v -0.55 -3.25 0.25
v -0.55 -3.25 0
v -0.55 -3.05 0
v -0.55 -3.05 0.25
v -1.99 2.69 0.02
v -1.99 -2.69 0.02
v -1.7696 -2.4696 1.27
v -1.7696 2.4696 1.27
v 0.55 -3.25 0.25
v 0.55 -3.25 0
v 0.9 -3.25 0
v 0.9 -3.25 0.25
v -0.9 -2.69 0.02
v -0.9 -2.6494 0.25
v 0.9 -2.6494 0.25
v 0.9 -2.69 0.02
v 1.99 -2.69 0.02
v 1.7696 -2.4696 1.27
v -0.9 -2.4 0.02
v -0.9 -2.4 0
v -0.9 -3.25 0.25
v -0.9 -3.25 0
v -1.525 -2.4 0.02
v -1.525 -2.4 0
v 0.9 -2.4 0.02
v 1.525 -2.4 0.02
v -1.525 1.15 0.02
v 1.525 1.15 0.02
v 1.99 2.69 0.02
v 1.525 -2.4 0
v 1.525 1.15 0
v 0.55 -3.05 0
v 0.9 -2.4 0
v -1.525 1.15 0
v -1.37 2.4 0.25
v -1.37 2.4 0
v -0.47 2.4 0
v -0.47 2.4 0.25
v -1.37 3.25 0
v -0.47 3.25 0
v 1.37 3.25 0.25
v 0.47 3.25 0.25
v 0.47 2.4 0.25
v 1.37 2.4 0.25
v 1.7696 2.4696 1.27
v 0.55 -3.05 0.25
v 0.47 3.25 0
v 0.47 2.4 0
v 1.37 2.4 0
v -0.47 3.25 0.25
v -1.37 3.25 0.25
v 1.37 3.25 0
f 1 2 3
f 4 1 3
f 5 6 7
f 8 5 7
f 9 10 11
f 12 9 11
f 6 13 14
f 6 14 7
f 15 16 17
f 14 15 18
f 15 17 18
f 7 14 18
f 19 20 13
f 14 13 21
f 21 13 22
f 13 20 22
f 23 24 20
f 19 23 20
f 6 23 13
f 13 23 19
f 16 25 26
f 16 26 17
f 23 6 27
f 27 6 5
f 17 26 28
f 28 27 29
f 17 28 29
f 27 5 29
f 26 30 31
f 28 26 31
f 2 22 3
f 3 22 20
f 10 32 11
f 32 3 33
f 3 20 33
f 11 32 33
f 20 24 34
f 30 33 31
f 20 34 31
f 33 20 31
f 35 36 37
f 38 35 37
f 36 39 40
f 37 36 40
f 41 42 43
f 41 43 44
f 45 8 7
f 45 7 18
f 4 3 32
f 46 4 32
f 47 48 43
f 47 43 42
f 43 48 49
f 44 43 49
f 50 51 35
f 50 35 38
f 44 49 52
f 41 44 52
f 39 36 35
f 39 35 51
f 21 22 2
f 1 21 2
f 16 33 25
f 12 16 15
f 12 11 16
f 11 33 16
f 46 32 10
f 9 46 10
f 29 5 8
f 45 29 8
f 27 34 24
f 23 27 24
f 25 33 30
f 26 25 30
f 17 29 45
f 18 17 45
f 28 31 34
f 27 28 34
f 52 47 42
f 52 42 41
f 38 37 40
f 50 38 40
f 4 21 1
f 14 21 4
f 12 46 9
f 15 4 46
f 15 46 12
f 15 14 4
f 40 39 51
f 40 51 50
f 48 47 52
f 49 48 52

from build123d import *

# Parameters (mm, degrees)
BOSS_EXTRUDE1_DEPTH   = 0.25
SKETCH2_W             = 0.9
SKETCH2_H             = 0.85
BOSS_EXTRUDE1_2_DEPTH = 0.25
BOSS_EXTRUDE1_3_DEPTH = 0.25
SKETCH3_W             = 3.98
SKETCH3_H             = 5.38
BOSS_EXTRUDE2_DEPTH   = 1.25
CHAMFER6_SIZE         = 1.25
CHAMFER6_SIZE_2       = 0.220408726
CHAMFER7_SIZE         = 1.25
CHAMFER7_SIZE_2       = 0.220408726
CHAMFER8_SIZE         = 1.25
CHAMFER8_SIZE_2       = 0.220408726


with BuildPart() as part:
    # Sketch2 → Boss-Extrude1 (new body)
    with BuildSketch(Plane.XY):
        Polygon((-1.525, 1.15), (-1.525, -2.4), (-0.9, -2.4), (-0.9, -3.25), (-0.55, -3.25), (-0.55, -3.05), (0.55, -3.05), (0.55, -3.25), (0.9, -3.25), (0.9, -2.4), (1.525, -2.4), (1.525, 1.15), align=None)
    extrude(amount=BOSS_EXTRUDE1_DEPTH)

    # Sketch3 → Boss-Extrude2 (add)
    with BuildSketch(Plane.XY.offset(0.02)):
        Rectangle(SKETCH3_W, SKETCH3_H)
    extrude(amount=BOSS_EXTRUDE2_DEPTH)

    # Chamfer6
    # the kernel refuses this chamfer: 1.25, 0.220408726 mm, written as the material it takes off along each edge
    with BuildSketch(Plane(origin=(5.238173496, -2.69, 1.27), x_dir=(0, -0.006682531656101757, -0.9999776716360547), z_dir=(-1, 0, 0))) as chamfer6_piece_1_section:
        Polygon((CHAMFER6_SIZE * 0.999977671636, -CHAMFER6_SIZE * 0.0066825316561), (-CHAMFER6_SIZE_2 * 0.00668253165263, -CHAMFER6_SIZE_2 * 0.999977671117), (0, 0), align=None)
    chamfer6_piece_1 = extrude(amount=10.476346991, mode=Mode.PRIVATE)
    chamfer6_piece_1 = split(chamfer6_piece_1, bisect_by=Plane(origin=(0.9, -2.695482191, 0.132342406), z_dir=(1, 0, 0)), keep=Keep.TOP, mode=Mode.PRIVATE)
    chamfer6_piece_1 = split(chamfer6_piece_1, bisect_by=Plane(origin=(3.069086748, -2.695482191, 0.25), z_dir=(0, 0, -1)), keep=Keep.TOP, mode=Mode.PRIVATE)
    add(chamfer6_piece_1, mode=Mode.SUBTRACT)
    with BuildSketch(Plane(origin=(5.238173496, -2.69, 1.27), x_dir=(0, -0.006682531656101757, -0.9999776716360547), z_dir=(-1, 0, 0))) as chamfer6_piece_2_section:
        Polygon((CHAMFER6_SIZE * 0.999977671636, -CHAMFER6_SIZE * 0.0066825316561), (-CHAMFER6_SIZE_2 * 0.00668253165263, -CHAMFER6_SIZE_2 * 0.999977671117), (0, 0), align=None)
    chamfer6_piece_2 = extrude(amount=10.476346991, mode=Mode.PRIVATE)
    chamfer6_piece_2 = split(chamfer6_piece_2, bisect_by=Plane(origin=(0.9, -2.625359241, 0.876081369), z_dir=(1, 0, 0)), keep=Keep.TOP, mode=Mode.PRIVATE)
    chamfer6_piece_2 = split(chamfer6_piece_2, bisect_by=Plane(origin=(3.069086748, -2.625359241, 0.25), z_dir=(0, 0, 1)), keep=Keep.TOP, mode=Mode.PRIVATE)
    add(chamfer6_piece_2, mode=Mode.SUBTRACT)
    with BuildSketch(Plane(origin=(5.238173496, -2.69, 1.27), x_dir=(0, -0.006682531656101757, -0.9999776716360547), z_dir=(-1, 0, 0))) as chamfer6_piece_3_section:
        Polygon((CHAMFER6_SIZE * 0.999977671636, -CHAMFER6_SIZE * 0.0066825316561), (-CHAMFER6_SIZE_2 * 0.00668253165263, -CHAMFER6_SIZE_2 * 0.999977671117), (0, 0), align=None)
    chamfer6_piece_3 = extrude(amount=10.476346991, mode=Mode.PRIVATE)
    chamfer6_piece_3 = split(chamfer6_piece_3, bisect_by=Plane(origin=(-0.9, -2.625359241, 0.876081369), z_dir=(1, 0, 0)), keep=Keep.TOP, mode=Mode.PRIVATE)
    chamfer6_piece_3 = split(chamfer6_piece_3, bisect_by=Plane(origin=(0.9, -2.625359241, 0.876081369), z_dir=(-1, 0, 0)), keep=Keep.TOP, mode=Mode.PRIVATE)
    chamfer6_piece_3 = split(chamfer6_piece_3, bisect_by=Plane(origin=(0, -2.625359241, 0.25), z_dir=(0, 0, 1)), keep=Keep.TOP, mode=Mode.PRIVATE)
    add(chamfer6_piece_3, mode=Mode.SUBTRACT)
    with BuildSketch(Plane(origin=(5.238173496, -2.69, 1.27), x_dir=(0, -0.006682531656101757, -0.9999776716360547), z_dir=(-1, 0, 0))) as chamfer6_piece_4_section:
        Polygon((CHAMFER6_SIZE * 0.999977671636, -CHAMFER6_SIZE * 0.0066825316561), (-CHAMFER6_SIZE_2 * 0.00668253165263, -CHAMFER6_SIZE_2 * 0.999977671117), (0, 0), align=None)
    chamfer6_piece_4 = extrude(amount=10.476346991, mode=Mode.PRIVATE)
    chamfer6_piece_4 = split(chamfer6_piece_4, bisect_by=Plane(origin=(-0.9, -2.695482191, 0.132342406), z_dir=(-1, 0, 0)), keep=Keep.TOP, mode=Mode.PRIVATE)
    chamfer6_piece_4 = split(chamfer6_piece_4, bisect_by=Plane(origin=(-3.069086748, -2.695482191, 0.25), z_dir=(0, 0, -1)), keep=Keep.TOP, mode=Mode.PRIVATE)
    add(chamfer6_piece_4, mode=Mode.SUBTRACT)
    with BuildSketch(Plane(origin=(5.238173496, -2.69, 1.27), x_dir=(0, -0.006682531656101757, -0.9999776716360547), z_dir=(-1, 0, 0))) as chamfer6_piece_5_section:
        Polygon((CHAMFER6_SIZE * 0.999977671636, -CHAMFER6_SIZE * 0.0066825316561), (-CHAMFER6_SIZE_2 * 0.00668253165263, -CHAMFER6_SIZE_2 * 0.999977671117), (0, 0), align=None)
    chamfer6_piece_5 = extrude(amount=10.476346991, mode=Mode.PRIVATE)
    chamfer6_piece_5 = split(chamfer6_piece_5, bisect_by=Plane(origin=(-0.9, -2.625359241, 0.876081369), z_dir=(-1, 0, 0)), keep=Keep.TOP, mode=Mode.PRIVATE)
    chamfer6_piece_5 = split(chamfer6_piece_5, bisect_by=Plane(origin=(-3.069086748, -2.625359241, 0.25), z_dir=(0, 0, 1)), keep=Keep.TOP, mode=Mode.PRIVATE)
    add(chamfer6_piece_5, mode=Mode.SUBTRACT)

    # Chamfer7
    # the kernel refuses this chamfer: 1.25, 0.220408726 mm, written as the material it takes off along each edge
    with BuildSketch(Plane(origin=(-5.238173496, 2.69, 1.27), x_dir=(0, 0.006682531656101757, -0.9999776716360547), z_dir=(1, 0, 0))) as chamfer7_piece_1:
        Polygon((CHAMFER7_SIZE * 0.999977671636, -CHAMFER7_SIZE * 0.0066825316561), (-CHAMFER7_SIZE_2 * 0.00668253165263, -CHAMFER7_SIZE_2 * 0.999977671117), (0, 0), align=None)
    extrude(amount=10.476346991, mode=Mode.SUBTRACT)

    # Chamfer8
    # the kernel refuses this chamfer: 1.25, 0.220408726 mm, written as the material it takes off along each edge
    with BuildSketch(Plane(origin=(-1.99, -5.71776477, 1.27), x_dir=(-0.006682531656101757, 0, -0.9999776716360547), z_dir=(0, 1, 0)), Plane(origin=(1.99, 5.71776477, 1.27), x_dir=(0.006682531656101757, 0, -0.9999776716360547), z_dir=(0, -1, 0))) as chamfer8_piece_1:
        Polygon((CHAMFER8_SIZE * 0.999977671636, -CHAMFER8_SIZE * 0.0066825316561), (-CHAMFER8_SIZE_2 * 0.00668253165263, -CHAMFER8_SIZE_2 * 0.999977671117), (0, 0), align=None)
    extrude(amount=11.435529539, mode=Mode.SUBTRACT)


with BuildPart() as body_2:
    # Sketch2 → Boss-Extrude1 2 (new body)
    with BuildSketch(Plane.XY):
        with Locations((-0.92, 2.825)):
            Rectangle(SKETCH2_W, SKETCH2_H)
    extrude(amount=BOSS_EXTRUDE1_2_DEPTH)


with BuildPart() as body_3:
    # Sketch2 → Boss-Extrude1 3 (new body)
    with BuildSketch(Plane.XY):
        with Locations((0.92, 2.825)):
            Rectangle(SKETCH2_W, SKETCH2_H)
    extrude(amount=BOSS_EXTRUDE1_3_DEPTH)


solid = Compound([part.part, body_2.part, body_3.part])
